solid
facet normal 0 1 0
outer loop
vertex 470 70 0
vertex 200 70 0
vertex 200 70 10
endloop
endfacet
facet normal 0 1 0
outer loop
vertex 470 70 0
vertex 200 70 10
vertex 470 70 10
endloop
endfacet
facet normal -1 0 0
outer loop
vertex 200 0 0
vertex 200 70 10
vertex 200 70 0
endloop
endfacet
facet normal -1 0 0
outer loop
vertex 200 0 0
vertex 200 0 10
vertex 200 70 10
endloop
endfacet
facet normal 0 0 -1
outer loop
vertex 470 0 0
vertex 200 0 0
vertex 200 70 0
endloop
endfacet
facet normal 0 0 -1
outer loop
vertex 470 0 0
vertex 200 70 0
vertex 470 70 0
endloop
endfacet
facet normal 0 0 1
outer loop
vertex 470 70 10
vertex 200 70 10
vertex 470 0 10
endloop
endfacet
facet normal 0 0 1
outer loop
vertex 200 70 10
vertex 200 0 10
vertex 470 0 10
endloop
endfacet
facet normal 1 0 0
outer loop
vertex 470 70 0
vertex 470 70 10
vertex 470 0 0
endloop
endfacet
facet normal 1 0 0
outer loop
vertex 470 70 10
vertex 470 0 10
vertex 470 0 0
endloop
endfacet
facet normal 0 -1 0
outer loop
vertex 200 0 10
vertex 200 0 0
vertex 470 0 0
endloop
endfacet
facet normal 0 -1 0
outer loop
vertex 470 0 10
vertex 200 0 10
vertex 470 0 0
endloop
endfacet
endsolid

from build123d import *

# Parameters (mm, degrees)
SKETCH2_W           = 500
SKETCH2_H           = 50
BOSS_EXTRUDE1_DEPTH = 10
CUT_EXTRUDE1_REACH  = 12
SKETCH3_W           = 200
SKETCH3_H           = 60
SKETCH3_W_2         = 30
SKETCH3_H_2         = 50
SKETCH4_W           = 270
SKETCH4_H           = 10
BOSS_EXTRUDE2_DEPTH = 20


with BuildPart() as part:
    # Sketch2 → Boss-Extrude1 (new body)
    with BuildSketch(Plane.XY):
        with Locations((250, 25)):
            Rectangle(SKETCH2_W, SKETCH2_H)
    extrude(amount=BOSS_EXTRUDE1_DEPTH)

    # Sketch3 → Cut-Extrude1 (cut, up to next)
    with BuildSketch(Plane(origin=(0, 0, 0), x_dir=(-1, 0, 0), z_dir=(0, 0, -1)), mode=Mode.PRIVATE) as cut_extrude1_sk1:
        with Locations((-100, 30)):
            Rectangle(SKETCH3_W, SKETCH3_H)
    cut_extrude1_tool1 = extrude(cut_extrude1_sk1.sketch, amount=-CUT_EXTRUDE1_REACH, mode=Mode.PRIVATE) & part.part
    add(cut_extrude1_tool1.solids().sort_by_distance((100, 30, 0))[0], mode=Mode.SUBTRACT)
    # Sketch3 → Cut-Extrude1 (cut, up to next)
    with BuildSketch(Plane(origin=(0, 0, 0), x_dir=(-1, 0, 0), z_dir=(0, 0, -1)), mode=Mode.PRIVATE) as cut_extrude1_sk2:
        with Locations((-485, 25)):
            Rectangle(SKETCH3_W_2, SKETCH3_H_2)
    cut_extrude1_tool2 = extrude(cut_extrude1_sk2.sketch, amount=-CUT_EXTRUDE1_REACH, mode=Mode.PRIVATE) & part.part
    add(cut_extrude1_tool2.solids().sort_by_distance((485, 25, 0))[0], mode=Mode.SUBTRACT)

    # Sketch4 → Boss-Extrude2 (add)
    with BuildSketch(Plane(origin=(0, 50, 0), x_dir=(1, 0, 0), z_dir=(0, 1, 0))):
        with Locations((335, -5)):
            Rectangle(SKETCH4_W, SKETCH4_H)
    extrude(amount=BOSS_EXTRUDE2_DEPTH)


solid = part.part
